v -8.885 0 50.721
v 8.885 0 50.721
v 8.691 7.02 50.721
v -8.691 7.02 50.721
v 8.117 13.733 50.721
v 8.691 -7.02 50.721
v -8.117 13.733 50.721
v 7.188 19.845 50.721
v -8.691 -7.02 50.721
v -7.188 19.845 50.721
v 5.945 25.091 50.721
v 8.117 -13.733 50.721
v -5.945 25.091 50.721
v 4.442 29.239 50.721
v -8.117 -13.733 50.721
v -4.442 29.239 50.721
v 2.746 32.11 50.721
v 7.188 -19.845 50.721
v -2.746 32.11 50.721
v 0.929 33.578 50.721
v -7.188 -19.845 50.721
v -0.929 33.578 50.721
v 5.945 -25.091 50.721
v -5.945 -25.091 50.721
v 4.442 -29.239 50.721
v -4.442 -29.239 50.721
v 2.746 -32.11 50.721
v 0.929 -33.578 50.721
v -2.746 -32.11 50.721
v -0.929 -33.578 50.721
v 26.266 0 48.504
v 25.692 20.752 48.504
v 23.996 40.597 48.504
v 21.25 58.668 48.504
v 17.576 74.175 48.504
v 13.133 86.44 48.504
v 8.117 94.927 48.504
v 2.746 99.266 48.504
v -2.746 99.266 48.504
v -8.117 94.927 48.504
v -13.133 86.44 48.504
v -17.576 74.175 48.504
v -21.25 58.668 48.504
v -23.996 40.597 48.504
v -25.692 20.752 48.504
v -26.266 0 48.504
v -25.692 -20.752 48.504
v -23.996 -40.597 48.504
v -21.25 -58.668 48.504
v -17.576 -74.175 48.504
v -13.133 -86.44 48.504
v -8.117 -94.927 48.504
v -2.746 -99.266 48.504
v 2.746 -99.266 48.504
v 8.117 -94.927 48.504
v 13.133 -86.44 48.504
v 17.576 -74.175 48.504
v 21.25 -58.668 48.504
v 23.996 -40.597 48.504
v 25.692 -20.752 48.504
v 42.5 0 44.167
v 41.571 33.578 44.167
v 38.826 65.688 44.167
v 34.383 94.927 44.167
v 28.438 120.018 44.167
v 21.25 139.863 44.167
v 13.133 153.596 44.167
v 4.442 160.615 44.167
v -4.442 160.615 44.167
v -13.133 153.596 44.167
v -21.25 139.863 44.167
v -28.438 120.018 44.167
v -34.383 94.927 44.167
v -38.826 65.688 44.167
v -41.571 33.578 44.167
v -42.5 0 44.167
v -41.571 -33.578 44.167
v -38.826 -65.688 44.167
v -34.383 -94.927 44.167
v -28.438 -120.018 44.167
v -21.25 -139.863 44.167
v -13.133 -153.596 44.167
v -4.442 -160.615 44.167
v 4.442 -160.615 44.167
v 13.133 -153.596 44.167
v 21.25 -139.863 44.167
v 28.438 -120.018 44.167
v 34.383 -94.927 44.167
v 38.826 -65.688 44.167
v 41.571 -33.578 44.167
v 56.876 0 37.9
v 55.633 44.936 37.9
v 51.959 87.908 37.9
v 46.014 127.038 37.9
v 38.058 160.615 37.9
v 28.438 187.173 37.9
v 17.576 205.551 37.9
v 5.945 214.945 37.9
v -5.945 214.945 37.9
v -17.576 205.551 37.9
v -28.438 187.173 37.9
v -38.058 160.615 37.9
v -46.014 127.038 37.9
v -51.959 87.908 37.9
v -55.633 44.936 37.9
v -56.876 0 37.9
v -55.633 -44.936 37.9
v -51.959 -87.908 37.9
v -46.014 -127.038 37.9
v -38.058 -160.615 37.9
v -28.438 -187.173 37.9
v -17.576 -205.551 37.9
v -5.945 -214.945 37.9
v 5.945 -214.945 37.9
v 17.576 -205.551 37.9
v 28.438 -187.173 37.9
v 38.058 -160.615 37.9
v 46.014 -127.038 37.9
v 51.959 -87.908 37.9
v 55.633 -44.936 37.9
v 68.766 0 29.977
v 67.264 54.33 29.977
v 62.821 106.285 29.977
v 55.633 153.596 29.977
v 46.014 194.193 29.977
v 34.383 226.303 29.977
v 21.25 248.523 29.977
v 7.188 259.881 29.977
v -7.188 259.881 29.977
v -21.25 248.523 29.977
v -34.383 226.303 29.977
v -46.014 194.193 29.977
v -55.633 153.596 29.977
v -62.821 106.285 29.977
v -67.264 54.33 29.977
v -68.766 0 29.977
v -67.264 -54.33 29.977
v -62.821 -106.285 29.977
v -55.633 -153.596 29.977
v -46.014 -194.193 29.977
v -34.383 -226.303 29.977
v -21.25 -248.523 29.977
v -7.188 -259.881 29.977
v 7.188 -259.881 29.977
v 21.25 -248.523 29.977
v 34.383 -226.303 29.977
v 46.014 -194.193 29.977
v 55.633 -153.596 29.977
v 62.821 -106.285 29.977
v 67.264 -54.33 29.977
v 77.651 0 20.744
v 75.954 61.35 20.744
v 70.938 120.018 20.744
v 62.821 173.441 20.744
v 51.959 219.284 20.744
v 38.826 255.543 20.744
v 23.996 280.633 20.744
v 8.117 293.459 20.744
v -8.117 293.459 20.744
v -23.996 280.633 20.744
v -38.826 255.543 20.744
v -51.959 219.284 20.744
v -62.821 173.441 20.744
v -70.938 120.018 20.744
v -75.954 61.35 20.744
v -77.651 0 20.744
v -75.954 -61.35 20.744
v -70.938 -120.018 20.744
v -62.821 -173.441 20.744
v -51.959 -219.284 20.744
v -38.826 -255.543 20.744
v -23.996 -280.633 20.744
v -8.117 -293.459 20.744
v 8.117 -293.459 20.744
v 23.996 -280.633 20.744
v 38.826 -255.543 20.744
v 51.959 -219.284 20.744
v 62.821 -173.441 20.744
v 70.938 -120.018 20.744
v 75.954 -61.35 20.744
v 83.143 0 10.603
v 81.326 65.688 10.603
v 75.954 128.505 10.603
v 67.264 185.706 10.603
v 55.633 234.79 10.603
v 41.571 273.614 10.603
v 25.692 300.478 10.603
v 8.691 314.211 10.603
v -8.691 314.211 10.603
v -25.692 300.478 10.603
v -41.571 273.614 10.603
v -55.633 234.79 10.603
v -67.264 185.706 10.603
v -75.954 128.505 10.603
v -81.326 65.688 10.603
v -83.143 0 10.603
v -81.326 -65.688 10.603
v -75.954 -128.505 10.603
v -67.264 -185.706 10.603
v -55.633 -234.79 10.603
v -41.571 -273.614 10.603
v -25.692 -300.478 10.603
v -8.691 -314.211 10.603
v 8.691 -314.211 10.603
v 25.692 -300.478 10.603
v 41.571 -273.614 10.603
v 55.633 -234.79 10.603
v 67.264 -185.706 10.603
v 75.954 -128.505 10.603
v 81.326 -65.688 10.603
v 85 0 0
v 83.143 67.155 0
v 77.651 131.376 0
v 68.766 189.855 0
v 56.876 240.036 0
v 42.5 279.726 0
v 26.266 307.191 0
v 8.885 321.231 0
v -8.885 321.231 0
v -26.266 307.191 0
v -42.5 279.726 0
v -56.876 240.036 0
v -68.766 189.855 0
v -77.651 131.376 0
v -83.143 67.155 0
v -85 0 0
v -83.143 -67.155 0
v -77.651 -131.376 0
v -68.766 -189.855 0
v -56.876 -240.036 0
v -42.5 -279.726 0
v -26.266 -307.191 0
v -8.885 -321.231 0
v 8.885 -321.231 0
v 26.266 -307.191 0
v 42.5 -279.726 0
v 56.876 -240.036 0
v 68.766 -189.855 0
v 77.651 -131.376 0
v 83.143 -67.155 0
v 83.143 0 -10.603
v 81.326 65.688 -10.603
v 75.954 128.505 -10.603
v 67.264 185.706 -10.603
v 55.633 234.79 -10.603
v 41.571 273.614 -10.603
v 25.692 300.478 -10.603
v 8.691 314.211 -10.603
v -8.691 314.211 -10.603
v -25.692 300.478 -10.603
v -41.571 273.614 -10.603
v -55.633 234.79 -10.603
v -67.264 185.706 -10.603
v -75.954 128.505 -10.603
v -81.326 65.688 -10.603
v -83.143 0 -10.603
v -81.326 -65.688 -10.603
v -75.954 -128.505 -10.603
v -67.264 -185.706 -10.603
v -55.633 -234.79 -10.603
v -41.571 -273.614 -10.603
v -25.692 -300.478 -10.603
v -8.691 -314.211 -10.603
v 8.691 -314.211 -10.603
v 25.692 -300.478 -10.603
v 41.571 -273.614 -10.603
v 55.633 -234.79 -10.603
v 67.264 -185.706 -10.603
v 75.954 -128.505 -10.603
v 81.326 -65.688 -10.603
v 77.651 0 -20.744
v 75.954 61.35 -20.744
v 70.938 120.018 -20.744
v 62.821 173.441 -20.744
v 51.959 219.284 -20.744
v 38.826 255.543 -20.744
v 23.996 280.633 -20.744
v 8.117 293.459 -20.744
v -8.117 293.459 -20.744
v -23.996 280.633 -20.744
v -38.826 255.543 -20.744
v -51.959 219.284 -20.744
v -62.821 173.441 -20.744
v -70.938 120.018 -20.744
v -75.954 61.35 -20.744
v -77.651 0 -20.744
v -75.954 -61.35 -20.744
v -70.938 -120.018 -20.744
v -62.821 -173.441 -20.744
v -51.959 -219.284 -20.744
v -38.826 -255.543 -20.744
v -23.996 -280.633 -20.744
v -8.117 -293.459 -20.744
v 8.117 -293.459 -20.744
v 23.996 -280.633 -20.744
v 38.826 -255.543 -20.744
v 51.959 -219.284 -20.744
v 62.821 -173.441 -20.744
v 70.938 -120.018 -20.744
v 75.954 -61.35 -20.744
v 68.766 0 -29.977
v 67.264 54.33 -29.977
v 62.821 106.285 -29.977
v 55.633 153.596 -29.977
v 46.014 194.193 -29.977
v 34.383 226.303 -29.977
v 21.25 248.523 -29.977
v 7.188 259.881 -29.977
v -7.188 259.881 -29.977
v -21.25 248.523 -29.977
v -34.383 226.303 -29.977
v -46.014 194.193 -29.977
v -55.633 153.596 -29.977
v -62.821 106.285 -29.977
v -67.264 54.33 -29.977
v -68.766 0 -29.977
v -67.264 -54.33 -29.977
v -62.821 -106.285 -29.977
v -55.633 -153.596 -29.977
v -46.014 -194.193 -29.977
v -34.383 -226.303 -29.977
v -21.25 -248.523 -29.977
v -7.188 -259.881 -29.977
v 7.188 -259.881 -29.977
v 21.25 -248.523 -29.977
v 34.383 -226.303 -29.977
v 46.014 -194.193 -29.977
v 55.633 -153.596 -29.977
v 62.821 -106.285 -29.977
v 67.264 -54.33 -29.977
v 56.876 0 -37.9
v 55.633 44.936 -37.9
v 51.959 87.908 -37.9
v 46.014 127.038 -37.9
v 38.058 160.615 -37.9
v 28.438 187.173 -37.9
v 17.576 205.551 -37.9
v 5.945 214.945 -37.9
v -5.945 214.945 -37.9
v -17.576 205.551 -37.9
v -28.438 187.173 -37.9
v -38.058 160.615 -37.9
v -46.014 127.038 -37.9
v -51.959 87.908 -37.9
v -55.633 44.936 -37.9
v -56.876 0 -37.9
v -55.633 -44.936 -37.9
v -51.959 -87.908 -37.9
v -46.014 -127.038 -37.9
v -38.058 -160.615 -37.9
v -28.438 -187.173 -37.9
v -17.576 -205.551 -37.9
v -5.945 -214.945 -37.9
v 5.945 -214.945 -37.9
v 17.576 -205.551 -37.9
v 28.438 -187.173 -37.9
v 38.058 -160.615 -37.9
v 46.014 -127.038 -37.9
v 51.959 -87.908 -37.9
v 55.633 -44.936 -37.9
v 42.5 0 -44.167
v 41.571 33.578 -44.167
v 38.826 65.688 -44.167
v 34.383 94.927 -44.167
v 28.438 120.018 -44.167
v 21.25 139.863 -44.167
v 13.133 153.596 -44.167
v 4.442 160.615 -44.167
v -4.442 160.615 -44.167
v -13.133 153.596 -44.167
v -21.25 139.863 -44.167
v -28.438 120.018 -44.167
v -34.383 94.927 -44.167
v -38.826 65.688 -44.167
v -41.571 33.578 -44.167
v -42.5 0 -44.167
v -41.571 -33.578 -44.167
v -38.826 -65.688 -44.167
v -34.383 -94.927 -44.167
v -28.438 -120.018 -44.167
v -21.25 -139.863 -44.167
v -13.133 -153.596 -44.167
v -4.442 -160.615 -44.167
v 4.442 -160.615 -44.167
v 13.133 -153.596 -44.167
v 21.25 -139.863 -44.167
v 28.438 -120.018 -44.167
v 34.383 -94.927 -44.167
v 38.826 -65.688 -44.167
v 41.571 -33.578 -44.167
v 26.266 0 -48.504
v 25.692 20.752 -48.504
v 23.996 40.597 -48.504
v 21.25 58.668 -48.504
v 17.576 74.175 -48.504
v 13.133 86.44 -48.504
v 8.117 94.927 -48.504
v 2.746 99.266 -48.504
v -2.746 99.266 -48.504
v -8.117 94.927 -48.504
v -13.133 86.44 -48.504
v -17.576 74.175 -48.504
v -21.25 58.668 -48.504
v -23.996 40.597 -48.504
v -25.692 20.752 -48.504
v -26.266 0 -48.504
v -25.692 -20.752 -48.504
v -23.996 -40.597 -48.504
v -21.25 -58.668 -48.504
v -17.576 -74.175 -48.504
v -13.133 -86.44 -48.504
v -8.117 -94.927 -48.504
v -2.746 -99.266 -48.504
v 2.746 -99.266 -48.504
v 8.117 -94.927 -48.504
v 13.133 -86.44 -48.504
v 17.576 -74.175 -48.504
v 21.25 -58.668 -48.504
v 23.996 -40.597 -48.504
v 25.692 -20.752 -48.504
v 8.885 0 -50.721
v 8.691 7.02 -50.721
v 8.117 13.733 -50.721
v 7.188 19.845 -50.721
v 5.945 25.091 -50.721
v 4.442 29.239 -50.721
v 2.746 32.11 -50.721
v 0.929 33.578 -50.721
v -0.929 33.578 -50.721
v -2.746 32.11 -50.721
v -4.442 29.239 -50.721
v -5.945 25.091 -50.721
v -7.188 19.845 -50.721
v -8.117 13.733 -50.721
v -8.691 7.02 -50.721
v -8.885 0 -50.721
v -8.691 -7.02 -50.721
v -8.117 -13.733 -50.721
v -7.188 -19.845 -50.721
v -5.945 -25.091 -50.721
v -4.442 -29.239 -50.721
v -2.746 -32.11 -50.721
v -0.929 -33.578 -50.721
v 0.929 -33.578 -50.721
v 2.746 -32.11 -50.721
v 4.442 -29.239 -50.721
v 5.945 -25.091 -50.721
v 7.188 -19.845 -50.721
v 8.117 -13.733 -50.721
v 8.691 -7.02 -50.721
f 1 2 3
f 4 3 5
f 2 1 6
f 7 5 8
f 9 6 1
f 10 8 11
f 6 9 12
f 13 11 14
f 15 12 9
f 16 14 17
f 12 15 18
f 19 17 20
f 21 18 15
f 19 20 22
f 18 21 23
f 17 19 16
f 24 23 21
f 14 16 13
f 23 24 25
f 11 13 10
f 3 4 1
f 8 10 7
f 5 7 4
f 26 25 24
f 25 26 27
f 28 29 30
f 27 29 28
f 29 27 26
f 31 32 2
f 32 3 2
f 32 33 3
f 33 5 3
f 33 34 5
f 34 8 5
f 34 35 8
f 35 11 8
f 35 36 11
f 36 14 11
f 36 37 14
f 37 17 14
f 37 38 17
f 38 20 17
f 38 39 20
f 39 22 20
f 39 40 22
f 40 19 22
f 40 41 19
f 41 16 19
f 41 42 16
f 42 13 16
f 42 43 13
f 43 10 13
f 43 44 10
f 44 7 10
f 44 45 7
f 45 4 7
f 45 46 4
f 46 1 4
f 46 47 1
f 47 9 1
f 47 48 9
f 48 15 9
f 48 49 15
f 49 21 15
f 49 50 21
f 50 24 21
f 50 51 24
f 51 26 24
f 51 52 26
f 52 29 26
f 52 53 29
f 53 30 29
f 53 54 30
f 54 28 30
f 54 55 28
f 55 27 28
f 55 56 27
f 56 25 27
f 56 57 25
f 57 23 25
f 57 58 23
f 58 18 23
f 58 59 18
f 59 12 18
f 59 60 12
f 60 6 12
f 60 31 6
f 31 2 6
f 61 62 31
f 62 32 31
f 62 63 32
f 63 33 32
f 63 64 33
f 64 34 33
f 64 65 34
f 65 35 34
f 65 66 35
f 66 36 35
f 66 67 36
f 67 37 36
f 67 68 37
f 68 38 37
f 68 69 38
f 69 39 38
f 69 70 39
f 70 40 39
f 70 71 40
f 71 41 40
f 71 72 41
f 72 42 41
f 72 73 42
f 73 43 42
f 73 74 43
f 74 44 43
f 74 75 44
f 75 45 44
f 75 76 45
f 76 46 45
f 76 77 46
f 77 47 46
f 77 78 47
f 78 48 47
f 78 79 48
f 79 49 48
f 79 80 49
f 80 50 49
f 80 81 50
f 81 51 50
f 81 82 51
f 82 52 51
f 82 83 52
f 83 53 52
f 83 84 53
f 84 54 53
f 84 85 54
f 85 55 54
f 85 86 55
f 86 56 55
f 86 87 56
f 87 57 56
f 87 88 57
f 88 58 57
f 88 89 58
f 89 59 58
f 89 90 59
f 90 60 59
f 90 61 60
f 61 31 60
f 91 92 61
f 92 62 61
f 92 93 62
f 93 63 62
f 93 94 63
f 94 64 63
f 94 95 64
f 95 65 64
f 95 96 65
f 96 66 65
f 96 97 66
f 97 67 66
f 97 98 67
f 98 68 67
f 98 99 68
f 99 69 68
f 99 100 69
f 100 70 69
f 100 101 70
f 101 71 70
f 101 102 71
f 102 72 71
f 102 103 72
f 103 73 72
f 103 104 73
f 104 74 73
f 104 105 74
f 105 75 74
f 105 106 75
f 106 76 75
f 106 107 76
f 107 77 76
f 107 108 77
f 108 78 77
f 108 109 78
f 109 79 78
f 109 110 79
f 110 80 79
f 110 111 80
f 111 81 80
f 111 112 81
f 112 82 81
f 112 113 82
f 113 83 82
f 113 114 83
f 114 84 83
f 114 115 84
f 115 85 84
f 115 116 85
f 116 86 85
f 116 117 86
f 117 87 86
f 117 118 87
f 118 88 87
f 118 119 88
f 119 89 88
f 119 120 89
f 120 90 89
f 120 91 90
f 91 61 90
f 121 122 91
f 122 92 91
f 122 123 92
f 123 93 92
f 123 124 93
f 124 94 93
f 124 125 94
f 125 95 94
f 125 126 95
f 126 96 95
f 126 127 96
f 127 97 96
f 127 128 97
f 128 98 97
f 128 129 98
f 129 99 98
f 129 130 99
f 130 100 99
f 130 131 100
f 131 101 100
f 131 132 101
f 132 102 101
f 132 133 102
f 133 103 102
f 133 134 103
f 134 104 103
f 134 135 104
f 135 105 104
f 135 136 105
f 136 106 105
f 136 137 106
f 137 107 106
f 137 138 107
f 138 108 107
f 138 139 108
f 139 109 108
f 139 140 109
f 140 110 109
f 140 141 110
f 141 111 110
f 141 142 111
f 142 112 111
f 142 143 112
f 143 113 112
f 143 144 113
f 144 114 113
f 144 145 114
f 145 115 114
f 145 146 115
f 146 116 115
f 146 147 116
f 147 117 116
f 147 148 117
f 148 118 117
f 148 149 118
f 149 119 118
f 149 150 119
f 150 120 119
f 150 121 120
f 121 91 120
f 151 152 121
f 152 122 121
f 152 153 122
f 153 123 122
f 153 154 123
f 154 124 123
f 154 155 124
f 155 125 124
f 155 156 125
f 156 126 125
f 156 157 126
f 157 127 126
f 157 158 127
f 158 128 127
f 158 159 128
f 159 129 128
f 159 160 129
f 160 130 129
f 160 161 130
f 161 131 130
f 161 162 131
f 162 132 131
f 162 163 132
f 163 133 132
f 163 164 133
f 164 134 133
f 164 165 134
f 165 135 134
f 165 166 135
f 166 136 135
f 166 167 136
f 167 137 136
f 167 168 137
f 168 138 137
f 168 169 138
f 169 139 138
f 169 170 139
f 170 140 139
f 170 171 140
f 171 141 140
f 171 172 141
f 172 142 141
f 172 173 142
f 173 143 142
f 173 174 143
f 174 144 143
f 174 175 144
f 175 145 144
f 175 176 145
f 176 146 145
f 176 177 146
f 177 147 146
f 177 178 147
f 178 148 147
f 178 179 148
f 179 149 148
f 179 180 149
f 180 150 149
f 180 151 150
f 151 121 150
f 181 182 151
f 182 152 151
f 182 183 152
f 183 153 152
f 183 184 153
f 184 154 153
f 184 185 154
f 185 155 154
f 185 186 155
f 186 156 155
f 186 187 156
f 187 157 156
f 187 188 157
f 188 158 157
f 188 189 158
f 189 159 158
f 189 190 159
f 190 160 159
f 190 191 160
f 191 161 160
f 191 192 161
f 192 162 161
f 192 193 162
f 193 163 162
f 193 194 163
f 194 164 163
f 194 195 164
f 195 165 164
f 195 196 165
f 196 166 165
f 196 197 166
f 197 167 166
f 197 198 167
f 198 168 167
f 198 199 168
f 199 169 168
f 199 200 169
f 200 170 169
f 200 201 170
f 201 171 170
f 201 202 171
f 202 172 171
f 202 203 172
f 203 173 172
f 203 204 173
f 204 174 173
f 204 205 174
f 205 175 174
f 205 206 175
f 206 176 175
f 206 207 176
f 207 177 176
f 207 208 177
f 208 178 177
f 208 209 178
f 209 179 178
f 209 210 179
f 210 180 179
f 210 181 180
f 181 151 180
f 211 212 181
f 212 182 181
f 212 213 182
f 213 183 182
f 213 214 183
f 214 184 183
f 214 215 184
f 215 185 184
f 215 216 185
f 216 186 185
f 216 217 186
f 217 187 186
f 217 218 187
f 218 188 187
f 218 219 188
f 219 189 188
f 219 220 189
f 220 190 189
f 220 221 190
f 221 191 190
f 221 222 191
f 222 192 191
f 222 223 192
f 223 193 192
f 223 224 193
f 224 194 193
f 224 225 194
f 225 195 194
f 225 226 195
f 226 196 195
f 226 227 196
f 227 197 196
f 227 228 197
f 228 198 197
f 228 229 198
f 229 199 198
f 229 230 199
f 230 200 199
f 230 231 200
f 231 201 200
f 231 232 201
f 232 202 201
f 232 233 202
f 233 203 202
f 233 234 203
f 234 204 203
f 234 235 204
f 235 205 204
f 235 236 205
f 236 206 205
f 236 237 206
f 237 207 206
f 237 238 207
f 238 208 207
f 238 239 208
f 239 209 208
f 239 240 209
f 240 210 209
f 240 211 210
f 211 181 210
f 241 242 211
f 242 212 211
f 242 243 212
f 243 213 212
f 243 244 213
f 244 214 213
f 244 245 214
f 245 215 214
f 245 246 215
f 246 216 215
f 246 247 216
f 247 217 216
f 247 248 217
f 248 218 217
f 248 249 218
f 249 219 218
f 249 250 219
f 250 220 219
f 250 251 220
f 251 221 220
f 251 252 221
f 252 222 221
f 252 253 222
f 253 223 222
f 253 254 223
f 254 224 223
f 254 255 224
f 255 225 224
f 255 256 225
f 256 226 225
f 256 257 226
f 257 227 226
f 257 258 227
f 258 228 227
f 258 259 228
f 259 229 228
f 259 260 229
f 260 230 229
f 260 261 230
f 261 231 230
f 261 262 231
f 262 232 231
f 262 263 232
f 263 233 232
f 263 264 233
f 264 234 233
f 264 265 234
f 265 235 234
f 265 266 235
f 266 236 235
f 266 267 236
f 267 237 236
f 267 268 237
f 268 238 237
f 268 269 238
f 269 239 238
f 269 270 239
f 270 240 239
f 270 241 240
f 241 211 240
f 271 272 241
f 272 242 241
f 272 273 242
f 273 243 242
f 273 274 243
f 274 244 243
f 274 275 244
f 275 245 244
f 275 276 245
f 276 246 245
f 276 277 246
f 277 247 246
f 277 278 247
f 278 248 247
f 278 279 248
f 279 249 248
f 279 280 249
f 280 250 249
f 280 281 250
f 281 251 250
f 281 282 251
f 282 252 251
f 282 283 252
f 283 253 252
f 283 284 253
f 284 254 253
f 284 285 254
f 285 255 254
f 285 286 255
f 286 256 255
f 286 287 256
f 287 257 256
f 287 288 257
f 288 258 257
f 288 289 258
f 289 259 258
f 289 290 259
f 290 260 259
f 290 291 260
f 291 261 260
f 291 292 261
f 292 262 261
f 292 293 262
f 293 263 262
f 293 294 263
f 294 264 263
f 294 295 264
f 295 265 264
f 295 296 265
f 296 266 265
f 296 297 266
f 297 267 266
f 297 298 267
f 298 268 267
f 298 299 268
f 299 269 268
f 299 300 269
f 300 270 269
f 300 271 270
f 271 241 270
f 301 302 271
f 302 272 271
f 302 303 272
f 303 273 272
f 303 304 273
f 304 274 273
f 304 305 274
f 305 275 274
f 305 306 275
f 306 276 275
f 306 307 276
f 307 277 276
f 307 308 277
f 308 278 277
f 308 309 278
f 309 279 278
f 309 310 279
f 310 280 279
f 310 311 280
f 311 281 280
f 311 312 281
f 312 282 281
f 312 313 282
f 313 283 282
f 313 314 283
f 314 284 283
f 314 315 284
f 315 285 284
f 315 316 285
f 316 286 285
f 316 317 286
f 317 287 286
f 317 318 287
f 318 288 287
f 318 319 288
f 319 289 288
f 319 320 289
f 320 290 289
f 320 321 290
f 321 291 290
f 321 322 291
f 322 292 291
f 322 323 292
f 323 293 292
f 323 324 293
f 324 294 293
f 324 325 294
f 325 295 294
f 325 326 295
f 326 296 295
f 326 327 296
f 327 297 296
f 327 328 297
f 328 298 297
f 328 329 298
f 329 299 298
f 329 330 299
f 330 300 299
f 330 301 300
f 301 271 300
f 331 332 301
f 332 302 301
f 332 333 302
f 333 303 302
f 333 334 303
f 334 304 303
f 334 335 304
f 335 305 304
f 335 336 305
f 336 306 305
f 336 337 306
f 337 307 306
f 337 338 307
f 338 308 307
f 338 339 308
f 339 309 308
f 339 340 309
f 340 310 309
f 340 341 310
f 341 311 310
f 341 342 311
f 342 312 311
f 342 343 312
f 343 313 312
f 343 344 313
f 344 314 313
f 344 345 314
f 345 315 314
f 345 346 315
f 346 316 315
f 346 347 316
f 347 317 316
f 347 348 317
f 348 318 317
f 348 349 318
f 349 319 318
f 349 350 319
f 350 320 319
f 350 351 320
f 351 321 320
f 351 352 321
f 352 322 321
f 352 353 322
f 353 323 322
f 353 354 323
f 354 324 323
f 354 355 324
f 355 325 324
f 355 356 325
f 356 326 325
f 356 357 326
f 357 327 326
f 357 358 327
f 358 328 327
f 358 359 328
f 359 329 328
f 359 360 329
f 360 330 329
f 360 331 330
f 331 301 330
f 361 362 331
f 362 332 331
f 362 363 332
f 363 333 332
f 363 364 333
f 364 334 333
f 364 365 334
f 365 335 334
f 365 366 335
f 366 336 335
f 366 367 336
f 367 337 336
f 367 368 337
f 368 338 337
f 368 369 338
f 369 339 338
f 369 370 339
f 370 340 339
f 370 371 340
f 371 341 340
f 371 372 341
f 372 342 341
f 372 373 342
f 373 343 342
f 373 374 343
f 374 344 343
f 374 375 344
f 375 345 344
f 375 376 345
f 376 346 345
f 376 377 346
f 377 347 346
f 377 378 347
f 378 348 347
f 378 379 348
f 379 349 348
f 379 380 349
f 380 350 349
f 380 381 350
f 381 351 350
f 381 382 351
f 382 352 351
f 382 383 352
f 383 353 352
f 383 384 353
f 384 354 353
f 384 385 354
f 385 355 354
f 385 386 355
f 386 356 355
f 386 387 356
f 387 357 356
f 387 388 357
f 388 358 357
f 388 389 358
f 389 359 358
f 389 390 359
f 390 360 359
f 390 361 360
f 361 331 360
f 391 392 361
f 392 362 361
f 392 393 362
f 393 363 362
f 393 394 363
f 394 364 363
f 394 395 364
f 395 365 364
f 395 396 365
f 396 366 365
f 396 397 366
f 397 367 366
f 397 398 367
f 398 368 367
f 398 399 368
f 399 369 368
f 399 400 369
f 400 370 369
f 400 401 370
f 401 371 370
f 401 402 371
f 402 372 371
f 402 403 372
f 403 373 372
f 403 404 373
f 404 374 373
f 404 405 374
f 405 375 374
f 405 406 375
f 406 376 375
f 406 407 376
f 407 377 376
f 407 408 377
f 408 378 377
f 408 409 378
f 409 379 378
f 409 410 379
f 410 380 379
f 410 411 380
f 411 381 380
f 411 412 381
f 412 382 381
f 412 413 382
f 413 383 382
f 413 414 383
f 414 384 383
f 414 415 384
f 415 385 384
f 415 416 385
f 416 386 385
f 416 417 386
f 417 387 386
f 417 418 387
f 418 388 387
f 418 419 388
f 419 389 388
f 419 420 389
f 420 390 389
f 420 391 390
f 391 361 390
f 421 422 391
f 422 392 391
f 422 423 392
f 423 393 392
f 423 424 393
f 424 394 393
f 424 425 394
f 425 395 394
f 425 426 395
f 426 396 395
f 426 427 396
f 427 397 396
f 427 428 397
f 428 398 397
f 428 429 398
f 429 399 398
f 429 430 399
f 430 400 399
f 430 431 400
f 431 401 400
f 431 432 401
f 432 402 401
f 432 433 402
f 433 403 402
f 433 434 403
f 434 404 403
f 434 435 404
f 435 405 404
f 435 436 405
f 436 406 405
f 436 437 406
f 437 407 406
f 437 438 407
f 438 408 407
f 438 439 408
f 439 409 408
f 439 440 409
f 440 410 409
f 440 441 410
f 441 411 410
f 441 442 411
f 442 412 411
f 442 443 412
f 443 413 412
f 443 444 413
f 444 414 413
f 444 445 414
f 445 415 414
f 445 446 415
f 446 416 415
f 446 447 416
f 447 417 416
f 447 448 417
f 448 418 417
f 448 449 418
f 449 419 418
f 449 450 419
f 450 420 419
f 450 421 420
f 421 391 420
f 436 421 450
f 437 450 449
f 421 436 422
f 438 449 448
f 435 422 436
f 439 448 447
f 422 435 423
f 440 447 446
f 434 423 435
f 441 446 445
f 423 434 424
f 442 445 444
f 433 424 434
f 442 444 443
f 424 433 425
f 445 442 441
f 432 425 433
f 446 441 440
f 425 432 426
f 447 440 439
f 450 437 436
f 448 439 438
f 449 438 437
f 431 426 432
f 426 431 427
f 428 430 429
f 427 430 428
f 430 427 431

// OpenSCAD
// Generated by SolidPython 1.0.1 on 2020-07-29 00:46:47


scale(v = [5, 19, 3]) {
	sphere(r = 17);
}
/***********************************************
*********      SolidPython code:      **********
************************************************
 
# import packages: SolidPython
from solid import *
from solid.utils import *
from itertools import chain, combinations, permutations


class Resize:

    def __init__(self, scad_file):
        self.scad_file = scad_file
        #self.scad_file = import_scad(scad_file)
        # cone/cylinder param:
        self.r1 = 0
        self.r2 = 0
        self.h = 0
        # rectangular prism param:
        self.w = 0
        self.l = 0
        # ellipse param:
        self.r = 0

    # import OpenScad code (file name corresponds to shape)


    # classify shape + parameters
    def assign(self, param1, param2, param3):
        if self.scad_file == 'cone.scad':
            self.r1 = param1
            self.r2 = param2
            self.h = param3
        elif self.scad_file == 'cylinder.scad':
            self.r1 = param1
            self.r2 = param2
            self.h = param3
        elif self.scad_file == 'rectangularPrism.scad':
            self.h = param1
            self.l = param2
            self.w = param3
        else:
            self.r = param1
            self.h = param2

    # resize parameters
    def iterate(self):
        x = range(3, 20, 2)
        i = 1
        if self.scad_file == 'cone.scad':
            tempList = list(permutations(x, 2))
            for temp in tempList:
                param1 = temp[0]
                param2 = temp[1]
                filepath = 'produced_scad_files/' + 'cone' + str(param1) + '_' + str(param2) + '_' + '.scad'
                scad_render_to_file(cylinder(h=param1, r1=param2, r2=0), filepath)

        elif self.scad_file == 'cylinder.scad':
            tempList = list(permutations(x, 3))
            for temp in tempList:
                param1 = temp[0]
                param2 = temp[1]
                filepath = 'produced_scad_files/' + 'cylinder' + str(param1) + '_' + str(param2) + '_' + '.scad'
                scad_render_to_file(cylinder(h=param1, r1=param2, r2=param2), filepath)

        elif self.scad_file == 'rectangularPrism.scad':
            tempList = list(permutations(x, 3))
            for temp in tempList:
                param1 = temp[0]
                param2 = temp[1]
                param3 = temp[2]
                filepath = 'produced_scad_files/' + 'rectangularPrism' + str(param1) + '_' + str(param2) + '_' + str(
                    param3) + '.scad'
                scad_render_to_file(cube(size=(param1, param2, param3)), filepath)

        elif self.scad_file == 'ellipse.scad':
            tempList = list(permutations(x, 4))
            for temp in tempList:
                param1 = temp[0]
                param2 = temp[1]
                param3 = temp[2]
                param4 = temp[3]
                filepath = 'produced_scad_files/' + 'ellipse' + str(param1) + '_' + str(param2) + '_' + str(param3) + '_' + str(param4) + '.scad'
                scad_render_to_file(scale([param1, param2, param3])(sphere(r=param4)), filepath)

    def render_to_scadfile(self):
        scad_render_to_file(scad, 'example.scad') 
 
************************************************/
